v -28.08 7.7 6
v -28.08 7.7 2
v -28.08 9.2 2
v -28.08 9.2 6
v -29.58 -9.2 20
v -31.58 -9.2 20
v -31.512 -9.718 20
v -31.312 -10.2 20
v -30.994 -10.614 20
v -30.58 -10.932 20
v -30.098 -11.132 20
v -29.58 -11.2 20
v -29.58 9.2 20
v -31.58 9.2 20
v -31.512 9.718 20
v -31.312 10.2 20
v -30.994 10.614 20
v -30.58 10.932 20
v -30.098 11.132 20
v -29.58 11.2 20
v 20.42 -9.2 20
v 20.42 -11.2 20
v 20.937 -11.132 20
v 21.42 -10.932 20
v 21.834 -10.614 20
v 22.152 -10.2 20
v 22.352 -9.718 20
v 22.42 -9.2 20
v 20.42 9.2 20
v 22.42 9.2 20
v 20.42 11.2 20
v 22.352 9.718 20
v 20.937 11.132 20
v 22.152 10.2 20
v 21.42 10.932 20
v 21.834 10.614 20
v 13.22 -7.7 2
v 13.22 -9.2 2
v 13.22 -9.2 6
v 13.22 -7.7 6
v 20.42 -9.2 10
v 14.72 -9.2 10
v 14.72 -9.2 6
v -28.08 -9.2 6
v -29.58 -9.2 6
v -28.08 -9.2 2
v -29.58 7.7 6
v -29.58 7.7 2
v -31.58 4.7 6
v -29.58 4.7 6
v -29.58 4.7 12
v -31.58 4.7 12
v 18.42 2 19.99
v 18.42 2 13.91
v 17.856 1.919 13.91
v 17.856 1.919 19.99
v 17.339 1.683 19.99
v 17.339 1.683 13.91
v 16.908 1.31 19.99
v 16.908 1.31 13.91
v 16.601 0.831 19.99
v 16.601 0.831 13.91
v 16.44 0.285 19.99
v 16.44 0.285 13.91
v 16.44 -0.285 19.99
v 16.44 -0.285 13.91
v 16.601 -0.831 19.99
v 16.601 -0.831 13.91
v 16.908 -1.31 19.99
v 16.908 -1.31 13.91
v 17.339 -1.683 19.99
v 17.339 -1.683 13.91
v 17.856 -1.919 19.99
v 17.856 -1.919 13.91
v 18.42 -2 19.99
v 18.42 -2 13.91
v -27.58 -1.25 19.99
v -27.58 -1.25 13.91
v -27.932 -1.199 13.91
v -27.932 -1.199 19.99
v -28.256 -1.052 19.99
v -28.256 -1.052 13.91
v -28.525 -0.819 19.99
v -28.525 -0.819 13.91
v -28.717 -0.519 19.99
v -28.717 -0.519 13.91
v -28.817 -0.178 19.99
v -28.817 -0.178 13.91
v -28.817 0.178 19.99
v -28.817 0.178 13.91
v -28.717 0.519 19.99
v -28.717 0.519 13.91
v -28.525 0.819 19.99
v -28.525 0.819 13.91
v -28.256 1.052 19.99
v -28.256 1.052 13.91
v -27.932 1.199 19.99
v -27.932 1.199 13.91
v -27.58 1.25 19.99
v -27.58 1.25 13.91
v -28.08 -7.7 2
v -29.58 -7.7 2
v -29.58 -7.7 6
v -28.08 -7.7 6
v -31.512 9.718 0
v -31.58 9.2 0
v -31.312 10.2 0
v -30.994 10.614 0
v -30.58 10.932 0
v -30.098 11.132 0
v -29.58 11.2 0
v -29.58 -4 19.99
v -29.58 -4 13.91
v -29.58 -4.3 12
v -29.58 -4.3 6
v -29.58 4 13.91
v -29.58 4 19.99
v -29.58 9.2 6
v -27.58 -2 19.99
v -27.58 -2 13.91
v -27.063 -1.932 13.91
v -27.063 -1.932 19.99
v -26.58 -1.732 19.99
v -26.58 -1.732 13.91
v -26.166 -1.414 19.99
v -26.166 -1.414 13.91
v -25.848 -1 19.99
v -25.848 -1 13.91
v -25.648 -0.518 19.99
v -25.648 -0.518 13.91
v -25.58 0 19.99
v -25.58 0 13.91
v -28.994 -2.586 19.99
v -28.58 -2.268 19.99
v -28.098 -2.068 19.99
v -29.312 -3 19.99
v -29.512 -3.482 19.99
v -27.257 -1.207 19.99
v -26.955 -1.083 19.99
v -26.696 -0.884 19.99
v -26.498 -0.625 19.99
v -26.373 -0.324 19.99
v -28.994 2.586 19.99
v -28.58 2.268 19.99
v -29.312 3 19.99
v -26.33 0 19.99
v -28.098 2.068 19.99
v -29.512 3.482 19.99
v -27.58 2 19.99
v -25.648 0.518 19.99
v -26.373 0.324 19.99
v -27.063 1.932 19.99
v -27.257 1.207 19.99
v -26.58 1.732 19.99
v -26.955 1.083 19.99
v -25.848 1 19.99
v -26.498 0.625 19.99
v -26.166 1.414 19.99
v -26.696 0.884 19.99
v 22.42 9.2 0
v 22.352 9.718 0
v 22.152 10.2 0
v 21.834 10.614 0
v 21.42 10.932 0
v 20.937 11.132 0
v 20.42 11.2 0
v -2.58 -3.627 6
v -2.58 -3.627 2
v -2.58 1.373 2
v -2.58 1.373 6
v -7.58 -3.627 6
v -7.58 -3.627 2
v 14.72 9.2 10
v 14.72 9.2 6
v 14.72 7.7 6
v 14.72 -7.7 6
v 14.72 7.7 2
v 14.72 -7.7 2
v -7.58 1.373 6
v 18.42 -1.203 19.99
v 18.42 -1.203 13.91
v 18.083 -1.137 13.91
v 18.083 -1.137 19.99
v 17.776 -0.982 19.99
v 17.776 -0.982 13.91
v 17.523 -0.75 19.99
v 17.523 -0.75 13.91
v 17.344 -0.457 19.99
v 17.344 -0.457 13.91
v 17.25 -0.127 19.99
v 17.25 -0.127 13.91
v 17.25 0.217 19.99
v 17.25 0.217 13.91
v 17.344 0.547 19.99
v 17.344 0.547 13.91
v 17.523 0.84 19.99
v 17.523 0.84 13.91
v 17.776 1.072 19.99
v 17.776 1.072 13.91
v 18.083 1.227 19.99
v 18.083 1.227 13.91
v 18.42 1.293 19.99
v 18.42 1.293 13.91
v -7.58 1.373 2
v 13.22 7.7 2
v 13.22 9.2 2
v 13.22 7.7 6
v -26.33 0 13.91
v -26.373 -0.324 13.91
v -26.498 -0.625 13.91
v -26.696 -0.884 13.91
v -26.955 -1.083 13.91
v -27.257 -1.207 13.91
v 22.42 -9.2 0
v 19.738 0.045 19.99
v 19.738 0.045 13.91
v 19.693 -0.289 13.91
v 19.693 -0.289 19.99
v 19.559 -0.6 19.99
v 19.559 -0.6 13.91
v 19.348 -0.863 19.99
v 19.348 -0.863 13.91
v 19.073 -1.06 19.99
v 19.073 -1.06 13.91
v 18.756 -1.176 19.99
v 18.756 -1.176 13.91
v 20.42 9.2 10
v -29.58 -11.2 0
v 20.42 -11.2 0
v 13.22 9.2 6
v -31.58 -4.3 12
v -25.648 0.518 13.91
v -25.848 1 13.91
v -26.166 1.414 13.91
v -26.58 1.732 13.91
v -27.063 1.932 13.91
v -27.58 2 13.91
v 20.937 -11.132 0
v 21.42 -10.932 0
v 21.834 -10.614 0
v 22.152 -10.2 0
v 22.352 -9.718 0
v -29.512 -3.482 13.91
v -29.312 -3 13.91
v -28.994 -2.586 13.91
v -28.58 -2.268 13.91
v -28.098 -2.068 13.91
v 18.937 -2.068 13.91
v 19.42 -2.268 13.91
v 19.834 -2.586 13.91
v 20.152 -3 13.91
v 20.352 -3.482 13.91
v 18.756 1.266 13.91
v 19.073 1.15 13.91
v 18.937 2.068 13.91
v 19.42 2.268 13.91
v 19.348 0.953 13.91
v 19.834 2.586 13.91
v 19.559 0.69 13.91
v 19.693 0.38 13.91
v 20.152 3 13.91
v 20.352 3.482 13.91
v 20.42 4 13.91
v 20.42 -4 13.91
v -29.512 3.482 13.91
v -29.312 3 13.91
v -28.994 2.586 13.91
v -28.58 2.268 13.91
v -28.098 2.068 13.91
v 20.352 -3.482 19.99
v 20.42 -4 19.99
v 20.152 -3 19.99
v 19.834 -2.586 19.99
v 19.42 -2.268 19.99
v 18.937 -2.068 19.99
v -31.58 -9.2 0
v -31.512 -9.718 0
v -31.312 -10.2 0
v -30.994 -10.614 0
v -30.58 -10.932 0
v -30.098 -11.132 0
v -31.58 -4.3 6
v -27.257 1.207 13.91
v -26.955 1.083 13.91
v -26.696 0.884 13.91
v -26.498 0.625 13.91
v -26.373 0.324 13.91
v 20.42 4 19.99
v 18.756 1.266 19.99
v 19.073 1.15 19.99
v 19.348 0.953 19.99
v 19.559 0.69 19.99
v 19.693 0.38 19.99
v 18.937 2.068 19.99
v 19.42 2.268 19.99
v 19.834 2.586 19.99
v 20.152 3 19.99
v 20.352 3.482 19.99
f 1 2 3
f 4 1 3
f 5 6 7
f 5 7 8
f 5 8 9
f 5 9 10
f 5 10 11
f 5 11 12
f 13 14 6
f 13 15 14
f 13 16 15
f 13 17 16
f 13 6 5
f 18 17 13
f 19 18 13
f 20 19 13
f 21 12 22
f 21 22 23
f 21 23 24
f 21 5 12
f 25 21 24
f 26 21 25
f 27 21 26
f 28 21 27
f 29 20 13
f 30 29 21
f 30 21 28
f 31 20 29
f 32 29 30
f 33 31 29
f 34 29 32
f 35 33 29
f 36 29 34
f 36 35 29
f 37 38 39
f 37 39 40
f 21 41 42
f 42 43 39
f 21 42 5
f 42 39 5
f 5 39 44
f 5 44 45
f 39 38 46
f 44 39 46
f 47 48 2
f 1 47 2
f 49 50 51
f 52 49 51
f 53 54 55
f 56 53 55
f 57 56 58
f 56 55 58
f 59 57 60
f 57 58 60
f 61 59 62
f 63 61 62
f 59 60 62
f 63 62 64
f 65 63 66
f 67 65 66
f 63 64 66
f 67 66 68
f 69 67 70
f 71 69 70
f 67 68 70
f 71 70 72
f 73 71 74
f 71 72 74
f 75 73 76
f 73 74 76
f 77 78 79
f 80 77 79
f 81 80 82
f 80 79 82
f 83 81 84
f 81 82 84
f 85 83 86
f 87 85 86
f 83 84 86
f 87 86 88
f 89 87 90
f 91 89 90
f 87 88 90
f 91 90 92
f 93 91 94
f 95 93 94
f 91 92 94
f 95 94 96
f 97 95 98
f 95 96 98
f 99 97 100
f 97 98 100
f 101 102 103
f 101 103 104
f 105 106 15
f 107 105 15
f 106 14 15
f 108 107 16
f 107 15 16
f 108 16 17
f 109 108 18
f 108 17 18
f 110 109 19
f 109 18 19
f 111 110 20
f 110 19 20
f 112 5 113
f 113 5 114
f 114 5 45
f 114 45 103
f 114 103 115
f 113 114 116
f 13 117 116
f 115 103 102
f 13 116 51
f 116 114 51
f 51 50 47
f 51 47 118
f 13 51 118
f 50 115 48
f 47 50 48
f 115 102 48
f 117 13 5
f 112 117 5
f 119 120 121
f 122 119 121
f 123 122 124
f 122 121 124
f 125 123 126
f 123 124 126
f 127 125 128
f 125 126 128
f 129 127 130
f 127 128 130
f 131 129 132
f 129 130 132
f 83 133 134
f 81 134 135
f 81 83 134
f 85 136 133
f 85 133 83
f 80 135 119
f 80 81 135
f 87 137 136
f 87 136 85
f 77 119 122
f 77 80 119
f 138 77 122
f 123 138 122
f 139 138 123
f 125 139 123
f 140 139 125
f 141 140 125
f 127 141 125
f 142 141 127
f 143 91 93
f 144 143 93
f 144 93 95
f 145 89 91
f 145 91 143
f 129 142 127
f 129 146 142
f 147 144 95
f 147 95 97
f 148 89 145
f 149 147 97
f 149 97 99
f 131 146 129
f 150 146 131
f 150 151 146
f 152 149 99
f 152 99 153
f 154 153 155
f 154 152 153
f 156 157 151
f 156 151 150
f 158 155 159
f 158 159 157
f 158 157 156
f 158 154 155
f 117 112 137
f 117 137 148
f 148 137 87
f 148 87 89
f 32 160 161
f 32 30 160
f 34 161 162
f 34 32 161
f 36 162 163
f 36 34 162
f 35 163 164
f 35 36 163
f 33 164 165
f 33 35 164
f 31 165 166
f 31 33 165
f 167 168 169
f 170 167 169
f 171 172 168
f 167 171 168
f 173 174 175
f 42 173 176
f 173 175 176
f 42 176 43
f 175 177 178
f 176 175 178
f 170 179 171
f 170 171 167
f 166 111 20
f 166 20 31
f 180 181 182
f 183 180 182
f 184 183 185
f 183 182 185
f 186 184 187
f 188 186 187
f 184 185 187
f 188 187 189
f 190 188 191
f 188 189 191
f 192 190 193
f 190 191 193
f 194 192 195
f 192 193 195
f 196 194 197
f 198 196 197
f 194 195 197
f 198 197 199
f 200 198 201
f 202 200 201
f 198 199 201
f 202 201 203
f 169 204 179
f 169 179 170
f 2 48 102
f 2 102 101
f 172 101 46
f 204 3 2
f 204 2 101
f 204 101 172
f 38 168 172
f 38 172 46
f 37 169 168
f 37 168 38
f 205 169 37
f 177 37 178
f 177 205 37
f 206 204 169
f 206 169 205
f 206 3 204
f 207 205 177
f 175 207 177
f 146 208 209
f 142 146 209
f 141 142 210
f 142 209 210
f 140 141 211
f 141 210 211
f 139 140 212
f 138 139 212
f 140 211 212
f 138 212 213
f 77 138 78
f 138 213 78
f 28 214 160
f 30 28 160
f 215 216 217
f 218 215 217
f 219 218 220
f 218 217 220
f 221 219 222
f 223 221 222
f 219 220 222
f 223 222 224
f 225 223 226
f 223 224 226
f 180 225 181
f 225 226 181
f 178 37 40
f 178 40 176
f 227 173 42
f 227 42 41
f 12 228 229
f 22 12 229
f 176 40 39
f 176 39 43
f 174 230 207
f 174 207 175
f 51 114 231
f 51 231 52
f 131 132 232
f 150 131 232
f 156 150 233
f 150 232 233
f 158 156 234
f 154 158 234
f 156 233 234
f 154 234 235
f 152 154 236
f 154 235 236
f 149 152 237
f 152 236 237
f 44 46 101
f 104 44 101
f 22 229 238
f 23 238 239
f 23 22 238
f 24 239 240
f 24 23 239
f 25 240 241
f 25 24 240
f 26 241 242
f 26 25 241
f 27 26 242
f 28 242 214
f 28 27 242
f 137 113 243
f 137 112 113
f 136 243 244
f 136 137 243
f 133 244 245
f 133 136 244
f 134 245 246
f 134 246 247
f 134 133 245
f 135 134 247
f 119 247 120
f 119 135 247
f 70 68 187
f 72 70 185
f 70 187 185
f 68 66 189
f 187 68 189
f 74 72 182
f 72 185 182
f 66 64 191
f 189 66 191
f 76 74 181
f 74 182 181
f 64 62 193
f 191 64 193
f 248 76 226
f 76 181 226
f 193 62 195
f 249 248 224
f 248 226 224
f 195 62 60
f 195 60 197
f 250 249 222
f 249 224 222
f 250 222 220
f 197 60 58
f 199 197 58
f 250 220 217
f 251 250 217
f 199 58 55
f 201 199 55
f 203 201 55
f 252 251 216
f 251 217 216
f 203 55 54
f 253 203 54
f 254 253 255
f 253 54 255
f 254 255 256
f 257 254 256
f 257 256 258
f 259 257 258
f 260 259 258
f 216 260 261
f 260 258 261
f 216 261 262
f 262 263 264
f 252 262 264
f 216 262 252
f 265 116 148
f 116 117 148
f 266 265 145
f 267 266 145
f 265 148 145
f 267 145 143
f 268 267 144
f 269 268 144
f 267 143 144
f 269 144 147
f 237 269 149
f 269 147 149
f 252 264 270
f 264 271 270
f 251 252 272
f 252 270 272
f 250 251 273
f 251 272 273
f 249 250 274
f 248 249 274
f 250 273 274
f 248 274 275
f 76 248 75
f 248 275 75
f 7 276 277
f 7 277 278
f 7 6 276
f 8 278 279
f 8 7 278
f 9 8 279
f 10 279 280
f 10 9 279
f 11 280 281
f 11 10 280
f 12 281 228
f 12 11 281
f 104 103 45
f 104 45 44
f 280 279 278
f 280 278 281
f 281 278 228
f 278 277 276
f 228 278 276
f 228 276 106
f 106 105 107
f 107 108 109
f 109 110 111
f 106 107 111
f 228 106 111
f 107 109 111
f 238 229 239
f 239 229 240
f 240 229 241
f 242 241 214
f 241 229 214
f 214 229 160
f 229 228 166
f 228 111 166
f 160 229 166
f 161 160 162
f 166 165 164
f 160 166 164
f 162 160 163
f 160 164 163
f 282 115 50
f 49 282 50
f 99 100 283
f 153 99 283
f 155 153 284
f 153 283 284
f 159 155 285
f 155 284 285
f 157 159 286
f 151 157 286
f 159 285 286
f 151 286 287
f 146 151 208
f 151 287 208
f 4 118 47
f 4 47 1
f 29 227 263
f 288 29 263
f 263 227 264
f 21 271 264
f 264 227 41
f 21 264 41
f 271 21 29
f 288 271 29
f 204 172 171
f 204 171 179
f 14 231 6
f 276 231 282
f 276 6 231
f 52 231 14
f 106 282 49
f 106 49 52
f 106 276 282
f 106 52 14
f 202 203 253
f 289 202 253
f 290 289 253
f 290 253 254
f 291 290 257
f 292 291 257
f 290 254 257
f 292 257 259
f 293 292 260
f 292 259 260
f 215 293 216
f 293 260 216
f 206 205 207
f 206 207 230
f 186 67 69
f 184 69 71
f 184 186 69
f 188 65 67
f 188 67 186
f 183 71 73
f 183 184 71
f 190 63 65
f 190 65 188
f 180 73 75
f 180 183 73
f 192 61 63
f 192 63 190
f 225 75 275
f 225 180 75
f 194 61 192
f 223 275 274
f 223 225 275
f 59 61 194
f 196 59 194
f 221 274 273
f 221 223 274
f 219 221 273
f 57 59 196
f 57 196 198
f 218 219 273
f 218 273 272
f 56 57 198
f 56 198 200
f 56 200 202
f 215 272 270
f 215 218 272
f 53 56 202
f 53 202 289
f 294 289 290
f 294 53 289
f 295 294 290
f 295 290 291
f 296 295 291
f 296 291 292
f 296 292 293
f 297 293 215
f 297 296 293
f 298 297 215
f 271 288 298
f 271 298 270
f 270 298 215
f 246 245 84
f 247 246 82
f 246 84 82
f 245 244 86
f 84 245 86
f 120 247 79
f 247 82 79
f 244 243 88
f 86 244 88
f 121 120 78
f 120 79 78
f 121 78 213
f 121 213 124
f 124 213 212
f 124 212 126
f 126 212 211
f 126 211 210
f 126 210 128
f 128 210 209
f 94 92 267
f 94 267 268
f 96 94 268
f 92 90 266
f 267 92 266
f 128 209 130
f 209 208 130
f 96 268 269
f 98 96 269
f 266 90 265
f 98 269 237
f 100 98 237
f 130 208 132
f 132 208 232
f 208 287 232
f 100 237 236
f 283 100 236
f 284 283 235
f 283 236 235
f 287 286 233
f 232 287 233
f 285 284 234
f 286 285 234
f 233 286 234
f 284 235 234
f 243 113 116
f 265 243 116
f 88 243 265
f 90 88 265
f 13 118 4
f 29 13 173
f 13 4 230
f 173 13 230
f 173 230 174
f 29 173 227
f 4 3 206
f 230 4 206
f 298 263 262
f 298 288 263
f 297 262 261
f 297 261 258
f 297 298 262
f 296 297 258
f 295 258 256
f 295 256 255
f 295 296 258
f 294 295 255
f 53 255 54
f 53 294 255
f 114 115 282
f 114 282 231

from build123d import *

# Parameters (mm, degrees)
F0_W     = 54
F0_H     = 22.4
F1_DEPTH = 20
F0_W_2   = 5
F0_H_2   = 5
F0_W_3   = 1.5
F0_H_3   = 1.5
F2_DEPTH = 2
F4_START = -20.2
F3_W     = 9
F3_H     = 6
F4_DEPTH = 15.6
F5_DEPTH = 10
F6_START = 13.91
F6_DEPTH = 6.08
F7_R     = 1.99999
F8_DEPTH = 6


# Not quite as in the source:
# - a fillet or chamfer is up to 0.001 mm smaller than in the source, because OpenCascade refuses the exact size


with BuildPart() as f1:
    # F0 (on Top) → F1 (new body)
    with BuildSketch(Plane.XY):
        with Locations((-4.5801811367, 0)):
            Rectangle(F0_W, F0_H)
        Polygon((-29.5801811367, 7.7), (-29.5801811367, 9.2), (-28.0801811367, 9.2), (13.2198188633, 9.2), (14.7198188633, 9.2), (20.4198188633, 9.2), (20.4198188633, 2), (20.4198188633, 0), (20.4198188633, -2), (20.4198188633, -9.2), (14.7198188633, -9.2), (13.2198188633, -9.2), (-28.0801811367, -9.2), (-29.5801811367, -9.2), (-29.5801811367, -7.7), (-29.5801811367, -2), (-29.5801811367, 0), (-29.5801811367, 2), align=None, mode=Mode.SUBTRACT)
    extrude(amount=F1_DEPTH)

    # F0 (on Top) → F2 (join)
    with BuildSketch(Plane.XY):
        with BuildLine():
            Line((20.4198188633, 9.2), (14.7198188633, 9.2))
            Line((14.7198188633, 9.2), (14.7198188633, 7.7))
            Line((14.7198188633, 7.7), (14.7198188633, -7.7))
            Line((14.7198188633, -7.7), (14.7198188633, -9.2))
            Line((14.7198188633, -9.2), (20.4198188633, -9.2))
            Line((20.4198188633, -9.2), (20.4198188633, -2))
            Line((20.4198188633, -2), (18.4198188633, -2))
            ThreePointArc((18.4198188633, -2), (16.4198188633, 0), (18.4198188633, 2))
            Line((18.4198188633, 2), (20.4198188633, 2))
            Line((20.4198188633, 2), (20.4198188633, 9.2))
        make_face()
        with BuildLine():
            Line((13.2198188633, 9.2), (-28.0801811367, 9.2))
            Line((-28.0801811367, 9.2), (-28.0801811367, 7.7))
            Line((-28.0801811367, 7.7), (-29.5801811367, 7.7))
            Line((-29.5801811367, 7.7), (-29.5801811367, 2))
            Line((-29.5801811367, 2), (-27.5801811367, 2))
            ThreePointArc((-27.5801811367, 2), (-26.1659675744, 1.4142135624), (-25.5801811367, 0))
            ThreePointArc((-25.5801811367, 0), (-26.1659675744, -1.4142135624), (-27.5801811367, -2))
            Line((-27.5801811367, -2), (-29.5801811367, -2))
            Line((-29.5801811367, -2), (-29.5801811367, -7.7))
            Line((-29.5801811367, -7.7), (-28.0801811367, -7.7))
            Line((-28.0801811367, -7.7), (-28.0801811367, -9.2))
            Line((-28.0801811367, -9.2), (13.2198188633, -9.2))
            Line((13.2198188633, -9.2), (13.2198188633, -7.7))
            Line((13.2198188633, -7.7), (14.7198188633, -7.7))
            Line((14.7198188633, -7.7), (14.7198188633, 7.7))
            Line((14.7198188633, 7.7), (13.2198188633, 7.7))
            Line((13.2198188633, 7.7), (13.2198188633, 9.2))
        make_face()
        with Locations((-5.0801811367, -1.1269363482)):
            Rectangle(F0_W_2, F0_H_2, mode=Mode.SUBTRACT)
        with BuildLine():
            ThreePointArc((18.4198188633, -2), (19.8340324256, -1.4142135624), (20.4198188633, 0))
            ThreePointArc((20.4198188633, 0), (19.8340324256, 1.4142135624), (18.4198188633, 2))
            Line((18.4198188633, 2), (18.4198188633, 1.2932023613))
            ThreePointArc((18.4198188633, 1.2932023613), (19.3476040738, 0.9528353135), (19.7382581234, 0.0450773405))
            ThreePointArc((19.7382581234, 0.0450773405), (19.3476040738, -0.8626806325), (18.4198188633, -1.2030476804))
            Line((18.4198188633, -1.2030476804), (18.4198188633, -2))
        make_face()
        with BuildLine():
            Line((20.4198188633, 0), (20.4198188633, 2))
            Line((20.4198188633, 2), (18.4198188633, 2))
            ThreePointArc((18.4198188633, 2), (19.8340324256, 1.4142135624), (20.4198188633, 0))
        make_face()
        with BuildLine():
            Line((20.4198188633, -2), (20.4198188633, 0))
            ThreePointArc((20.4198188633, 0), (19.8340324256, -1.4142135624), (18.4198188633, -2))
            Line((18.4198188633, -2), (20.4198188633, -2))
        make_face()
        with BuildLine():
            Line((18.4198188633, 1.2932023613), (18.4198188633, 2))
            ThreePointArc((18.4198188633, 2), (16.4198188633, 0), (18.4198188633, -2))
            Line((18.4198188633, -2), (18.4198188633, -1.2030476804))
            ThreePointArc((18.4198188633, -1.2030476804), (17.2382581234, 0.0450773405), (18.4198188633, 1.2932023613))
        make_face()
        with BuildLine():
            Line((18.4198188633, -1.2030476804), (18.4198188633, 1.2932023613))
            ThreePointArc((18.4198188633, 1.2932023613), (17.2382581234, 0.0450773405), (18.4198188633, -1.2030476804))
        make_face()
        with BuildLine():
            ThreePointArc((19.7382581234, 0.0450773405), (19.3476040738, 0.9528353135), (18.4198188633, 1.2932023613))
            Line((18.4198188633, 1.2932023613), (18.4198188633, -1.2030476804))
            ThreePointArc((18.4198188633, -1.2030476804), (19.3476040738, -0.8626806325), (19.7382581234, 0.0450773405))
        make_face()
        with BuildLine():
            Line((-27.5801811367, 2), (-29.5801811367, 2))
            Line((-29.5801811367, 2), (-29.5801811367, 0))
            ThreePointArc((-29.5801811367, 0), (-28.9943946991, 1.4142135624), (-27.5801811367, 2))
        make_face()
        with BuildLine():
            ThreePointArc((-27.5801811367, -2), (-28.9943946991, -1.4142135624), (-29.5801811367, 0))
            Line((-29.5801811367, 0), (-29.5801811367, -2))
            Line((-29.5801811367, -2), (-27.5801811367, -2))
        make_face()
        with BuildLine():
            ThreePointArc((-27.5801811367, 2), (-28.9943946991, 1.4142135624), (-29.5801811367, 0))
            ThreePointArc((-29.5801811367, 0), (-28.9943946991, -1.4142135624), (-27.5801811367, -2))
            Line((-27.5801811367, -2), (-27.5801811367, -1.25))
            ThreePointArc((-27.5801811367, -1.25), (-28.8301811367, 0), (-27.5801811367, 1.25))
            Line((-27.5801811367, 1.25), (-27.5801811367, 2))
        make_face()
        with BuildLine():
            ThreePointArc((-25.5801811367, 0), (-26.1659675744, 1.4142135624), (-27.5801811367, 2))
            Line((-27.5801811367, 2), (-27.5801811367, 1.25))
            ThreePointArc((-27.5801811367, 1.25), (-26.6962976602, 0.8838834765), (-26.3301811367, 0))
            ThreePointArc((-26.3301811367, 0), (-26.6962976602, -0.8838834765), (-27.5801811367, -1.25))
            Line((-27.5801811367, -1.25), (-27.5801811367, -2))
            ThreePointArc((-27.5801811367, -2), (-26.1659675744, -1.4142135624), (-25.5801811367, 0))
        make_face()
        with BuildLine():
            ThreePointArc((-26.3301811367, 0), (-26.6962976602, 0.8838834765), (-27.5801811367, 1.25))
            Line((-27.5801811367, 1.25), (-27.5801811367, -1.25))
            ThreePointArc((-27.5801811367, -1.25), (-26.6962976602, -0.8838834765), (-26.3301811367, 0))
        make_face()
        with BuildLine():
            Line((-27.5801811367, -1.25), (-27.5801811367, 1.25))
            ThreePointArc((-27.5801811367, 1.25), (-28.8301811367, 0), (-27.5801811367, -1.25))
        make_face()
        with Locations((-5.0801811367, -1.1269363482)):
            Rectangle(F0_W_2, F0_H_2)
        with Locations((-28.8301811367, 8.45)):
            Rectangle(F0_W_3, F0_H_3)
        with Locations((-28.8301811367, -8.45)):
            Rectangle(F0_W_3, F0_H_3)
        with Locations((13.9698188633, 8.45)):
            Rectangle(F0_W_3, F0_H_3)
        with Locations((13.9698188633, -8.45)):
            Rectangle(F0_W_3, F0_H_3)
    extrude(amount=F2_DEPTH)

    # F3 (on Right) → F4 (cut)
    with BuildSketch(Plane.YZ.offset(F4_START)):
        with Locations((0.2, 9)):
            Rectangle(F3_W, F3_H)
    extrude(amount=-F4_DEPTH, mode=Mode.SUBTRACT)

    # F0 (on Top) → F5 (join)
    with BuildSketch(Plane.XY):
        with BuildLine():
            Line((18.4198188633, 1.2932023613), (18.4198188633, 2))
            ThreePointArc((18.4198188633, 2), (16.4198188633, 0), (18.4198188633, -2))
            Line((18.4198188633, -2), (18.4198188633, -1.2030476804))
            ThreePointArc((18.4198188633, -1.2030476804), (17.2382581234, 0.0450773405), (18.4198188633, 1.2932023613))
        make_face()
        with BuildLine():
            Line((18.4198188633, -1.2030476804), (18.4198188633, 1.2932023613))
            ThreePointArc((18.4198188633, 1.2932023613), (17.2382581234, 0.0450773405), (18.4198188633, -1.2030476804))
        make_face()
        with BuildLine():
            ThreePointArc((19.7382581234, 0.0450773405), (19.3476040738, 0.9528353135), (18.4198188633, 1.2932023613))
            Line((18.4198188633, 1.2932023613), (18.4198188633, -1.2030476804))
            ThreePointArc((18.4198188633, -1.2030476804), (19.3476040738, -0.8626806325), (19.7382581234, 0.0450773405))
        make_face()
        with BuildLine():
            ThreePointArc((18.4198188633, -2), (19.8340324256, -1.4142135624), (20.4198188633, 0))
            ThreePointArc((20.4198188633, 0), (19.8340324256, 1.4142135624), (18.4198188633, 2))
            Line((18.4198188633, 2), (18.4198188633, 1.2932023613))
            ThreePointArc((18.4198188633, 1.2932023613), (19.3476040738, 0.9528353135), (19.7382581234, 0.0450773405))
            ThreePointArc((19.7382581234, 0.0450773405), (19.3476040738, -0.8626806325), (18.4198188633, -1.2030476804))
            Line((18.4198188633, -1.2030476804), (18.4198188633, -2))
        make_face()
        with BuildLine():
            Line((20.4198188633, 0), (20.4198188633, 2))
            Line((20.4198188633, 2), (18.4198188633, 2))
            ThreePointArc((18.4198188633, 2), (19.8340324256, 1.4142135624), (20.4198188633, 0))
        make_face()
        with BuildLine():
            Line((20.4198188633, -2), (20.4198188633, 0))
            ThreePointArc((20.4198188633, 0), (19.8340324256, -1.4142135624), (18.4198188633, -2))
            Line((18.4198188633, -2), (20.4198188633, -2))
        make_face()
        with BuildLine():
            Line((20.4198188633, 9.2), (14.7198188633, 9.2))
            Line((14.7198188633, 9.2), (14.7198188633, 7.7))
            Line((14.7198188633, 7.7), (14.7198188633, -7.7))
            Line((14.7198188633, -7.7), (14.7198188633, -9.2))
            Line((14.7198188633, -9.2), (20.4198188633, -9.2))
            Line((20.4198188633, -9.2), (20.4198188633, -2))
            Line((20.4198188633, -2), (18.4198188633, -2))
            ThreePointArc((18.4198188633, -2), (16.4198188633, 0), (18.4198188633, 2))
            Line((18.4198188633, 2), (20.4198188633, 2))
            Line((20.4198188633, 2), (20.4198188633, 9.2))
        make_face()
    extrude(amount=F5_DEPTH)

    # F0 (on Top) → F6 (join)
    with BuildSketch(Plane.XY.offset(F6_START)):
        with BuildLine():
            Line((20.4198188633, 0), (20.4198188633, 2))
            Line((20.4198188633, 2), (18.4198188633, 2))
            ThreePointArc((18.4198188633, 2), (19.8340324256, 1.4142135624), (20.4198188633, 0))
        make_face()
        with BuildLine():
            ThreePointArc((18.4198188633, -2), (19.8340324256, -1.4142135624), (20.4198188633, 0))
            ThreePointArc((20.4198188633, 0), (19.8340324256, 1.4142135624), (18.4198188633, 2))
            Line((18.4198188633, 2), (18.4198188633, 1.2932023613))
            ThreePointArc((18.4198188633, 1.2932023613), (19.3476040738, 0.9528353135), (19.7382581234, 0.0450773405))
            ThreePointArc((19.7382581234, 0.0450773405), (19.3476040738, -0.8626806325), (18.4198188633, -1.2030476804))
            Line((18.4198188633, -1.2030476804), (18.4198188633, -2))
        make_face()
        with BuildLine():
            Line((20.4198188633, -2), (20.4198188633, 0))
            ThreePointArc((20.4198188633, 0), (19.8340324256, -1.4142135624), (18.4198188633, -2))
            Line((18.4198188633, -2), (20.4198188633, -2))
        make_face()
        with BuildLine():
            Line((18.4198188633, 1.2932023613), (18.4198188633, 2))
            ThreePointArc((18.4198188633, 2), (16.4198188633, 0), (18.4198188633, -2))
            Line((18.4198188633, -2), (18.4198188633, -1.2030476804))
            ThreePointArc((18.4198188633, -1.2030476804), (17.2382581234, 0.0450773405), (18.4198188633, 1.2932023613))
        make_face()
        with BuildLine():
            Line((-27.5801811367, 2), (-29.5801811367, 2))
            Line((-29.5801811367, 2), (-29.5801811367, 0))
            ThreePointArc((-29.5801811367, 0), (-28.9943946991, 1.4142135624), (-27.5801811367, 2))
        make_face()
        with BuildLine():
            ThreePointArc((-27.5801811367, 2), (-28.9943946991, 1.4142135624), (-29.5801811367, 0))
            ThreePointArc((-29.5801811367, 0), (-28.9943946991, -1.4142135624), (-27.5801811367, -2))
            Line((-27.5801811367, -2), (-27.5801811367, -1.25))
            ThreePointArc((-27.5801811367, -1.25), (-28.8301811367, 0), (-27.5801811367, 1.25))
            Line((-27.5801811367, 1.25), (-27.5801811367, 2))
        make_face()
        with BuildLine():
            ThreePointArc((-25.5801811367, 0), (-26.1659675744, 1.4142135624), (-27.5801811367, 2))
            Line((-27.5801811367, 2), (-27.5801811367, 1.25))
            ThreePointArc((-27.5801811367, 1.25), (-26.6962976602, 0.8838834765), (-26.3301811367, 0))
            ThreePointArc((-26.3301811367, 0), (-26.6962976602, -0.8838834765), (-27.5801811367, -1.25))
            Line((-27.5801811367, -1.25), (-27.5801811367, -2))
            ThreePointArc((-27.5801811367, -2), (-26.1659675744, -1.4142135624), (-25.5801811367, 0))
        make_face()
        with BuildLine():
            ThreePointArc((-27.5801811367, -2), (-28.9943946991, -1.4142135624), (-29.5801811367, 0))
            Line((-29.5801811367, 0), (-29.5801811367, -2))
            Line((-29.5801811367, -2), (-27.5801811367, -2))
        make_face()
    extrude(amount=F6_DEPTH)

    # F7 (radius 2 in the source; OpenCascade refuses exactly that, so slightly less here)
    f7_edges = [f1.edges().sort_by_distance(p)[0] for p in [
        (-31.580181, -11.2, 10),
        (-31.580181, 11.2, 10),
        (22.419819, 11.2, 10),
        (-29.580181, 2, 16.95),
        (-29.580181, -2, 16.95),
        (20.419819, -2, 16.95),
        (20.419819, 2, 16.95),
        (22.419819, -11.2, 10),
    ]]
    fillet(f7_edges, radius=F7_R)

    # F0 (on Top) → F8 (join)
    with BuildSketch(Plane.XY):
        with Locations((-5.0801811367, -1.1269363482)):
            Rectangle(F0_W_2, F0_H_2)
        with Locations((-28.8301811367, 8.45)):
            Rectangle(F0_W_3, F0_H_3)
        with Locations((-28.8301811367, -8.45)):
            Rectangle(F0_W_3, F0_H_3)
        with Locations((13.9698188633, 8.45)):
            Rectangle(F0_W_3, F0_H_3)
        with Locations((13.9698188633, -8.45)):
            Rectangle(F0_W_3, F0_H_3)
    extrude(amount=F8_DEPTH)


solid = f1.part
